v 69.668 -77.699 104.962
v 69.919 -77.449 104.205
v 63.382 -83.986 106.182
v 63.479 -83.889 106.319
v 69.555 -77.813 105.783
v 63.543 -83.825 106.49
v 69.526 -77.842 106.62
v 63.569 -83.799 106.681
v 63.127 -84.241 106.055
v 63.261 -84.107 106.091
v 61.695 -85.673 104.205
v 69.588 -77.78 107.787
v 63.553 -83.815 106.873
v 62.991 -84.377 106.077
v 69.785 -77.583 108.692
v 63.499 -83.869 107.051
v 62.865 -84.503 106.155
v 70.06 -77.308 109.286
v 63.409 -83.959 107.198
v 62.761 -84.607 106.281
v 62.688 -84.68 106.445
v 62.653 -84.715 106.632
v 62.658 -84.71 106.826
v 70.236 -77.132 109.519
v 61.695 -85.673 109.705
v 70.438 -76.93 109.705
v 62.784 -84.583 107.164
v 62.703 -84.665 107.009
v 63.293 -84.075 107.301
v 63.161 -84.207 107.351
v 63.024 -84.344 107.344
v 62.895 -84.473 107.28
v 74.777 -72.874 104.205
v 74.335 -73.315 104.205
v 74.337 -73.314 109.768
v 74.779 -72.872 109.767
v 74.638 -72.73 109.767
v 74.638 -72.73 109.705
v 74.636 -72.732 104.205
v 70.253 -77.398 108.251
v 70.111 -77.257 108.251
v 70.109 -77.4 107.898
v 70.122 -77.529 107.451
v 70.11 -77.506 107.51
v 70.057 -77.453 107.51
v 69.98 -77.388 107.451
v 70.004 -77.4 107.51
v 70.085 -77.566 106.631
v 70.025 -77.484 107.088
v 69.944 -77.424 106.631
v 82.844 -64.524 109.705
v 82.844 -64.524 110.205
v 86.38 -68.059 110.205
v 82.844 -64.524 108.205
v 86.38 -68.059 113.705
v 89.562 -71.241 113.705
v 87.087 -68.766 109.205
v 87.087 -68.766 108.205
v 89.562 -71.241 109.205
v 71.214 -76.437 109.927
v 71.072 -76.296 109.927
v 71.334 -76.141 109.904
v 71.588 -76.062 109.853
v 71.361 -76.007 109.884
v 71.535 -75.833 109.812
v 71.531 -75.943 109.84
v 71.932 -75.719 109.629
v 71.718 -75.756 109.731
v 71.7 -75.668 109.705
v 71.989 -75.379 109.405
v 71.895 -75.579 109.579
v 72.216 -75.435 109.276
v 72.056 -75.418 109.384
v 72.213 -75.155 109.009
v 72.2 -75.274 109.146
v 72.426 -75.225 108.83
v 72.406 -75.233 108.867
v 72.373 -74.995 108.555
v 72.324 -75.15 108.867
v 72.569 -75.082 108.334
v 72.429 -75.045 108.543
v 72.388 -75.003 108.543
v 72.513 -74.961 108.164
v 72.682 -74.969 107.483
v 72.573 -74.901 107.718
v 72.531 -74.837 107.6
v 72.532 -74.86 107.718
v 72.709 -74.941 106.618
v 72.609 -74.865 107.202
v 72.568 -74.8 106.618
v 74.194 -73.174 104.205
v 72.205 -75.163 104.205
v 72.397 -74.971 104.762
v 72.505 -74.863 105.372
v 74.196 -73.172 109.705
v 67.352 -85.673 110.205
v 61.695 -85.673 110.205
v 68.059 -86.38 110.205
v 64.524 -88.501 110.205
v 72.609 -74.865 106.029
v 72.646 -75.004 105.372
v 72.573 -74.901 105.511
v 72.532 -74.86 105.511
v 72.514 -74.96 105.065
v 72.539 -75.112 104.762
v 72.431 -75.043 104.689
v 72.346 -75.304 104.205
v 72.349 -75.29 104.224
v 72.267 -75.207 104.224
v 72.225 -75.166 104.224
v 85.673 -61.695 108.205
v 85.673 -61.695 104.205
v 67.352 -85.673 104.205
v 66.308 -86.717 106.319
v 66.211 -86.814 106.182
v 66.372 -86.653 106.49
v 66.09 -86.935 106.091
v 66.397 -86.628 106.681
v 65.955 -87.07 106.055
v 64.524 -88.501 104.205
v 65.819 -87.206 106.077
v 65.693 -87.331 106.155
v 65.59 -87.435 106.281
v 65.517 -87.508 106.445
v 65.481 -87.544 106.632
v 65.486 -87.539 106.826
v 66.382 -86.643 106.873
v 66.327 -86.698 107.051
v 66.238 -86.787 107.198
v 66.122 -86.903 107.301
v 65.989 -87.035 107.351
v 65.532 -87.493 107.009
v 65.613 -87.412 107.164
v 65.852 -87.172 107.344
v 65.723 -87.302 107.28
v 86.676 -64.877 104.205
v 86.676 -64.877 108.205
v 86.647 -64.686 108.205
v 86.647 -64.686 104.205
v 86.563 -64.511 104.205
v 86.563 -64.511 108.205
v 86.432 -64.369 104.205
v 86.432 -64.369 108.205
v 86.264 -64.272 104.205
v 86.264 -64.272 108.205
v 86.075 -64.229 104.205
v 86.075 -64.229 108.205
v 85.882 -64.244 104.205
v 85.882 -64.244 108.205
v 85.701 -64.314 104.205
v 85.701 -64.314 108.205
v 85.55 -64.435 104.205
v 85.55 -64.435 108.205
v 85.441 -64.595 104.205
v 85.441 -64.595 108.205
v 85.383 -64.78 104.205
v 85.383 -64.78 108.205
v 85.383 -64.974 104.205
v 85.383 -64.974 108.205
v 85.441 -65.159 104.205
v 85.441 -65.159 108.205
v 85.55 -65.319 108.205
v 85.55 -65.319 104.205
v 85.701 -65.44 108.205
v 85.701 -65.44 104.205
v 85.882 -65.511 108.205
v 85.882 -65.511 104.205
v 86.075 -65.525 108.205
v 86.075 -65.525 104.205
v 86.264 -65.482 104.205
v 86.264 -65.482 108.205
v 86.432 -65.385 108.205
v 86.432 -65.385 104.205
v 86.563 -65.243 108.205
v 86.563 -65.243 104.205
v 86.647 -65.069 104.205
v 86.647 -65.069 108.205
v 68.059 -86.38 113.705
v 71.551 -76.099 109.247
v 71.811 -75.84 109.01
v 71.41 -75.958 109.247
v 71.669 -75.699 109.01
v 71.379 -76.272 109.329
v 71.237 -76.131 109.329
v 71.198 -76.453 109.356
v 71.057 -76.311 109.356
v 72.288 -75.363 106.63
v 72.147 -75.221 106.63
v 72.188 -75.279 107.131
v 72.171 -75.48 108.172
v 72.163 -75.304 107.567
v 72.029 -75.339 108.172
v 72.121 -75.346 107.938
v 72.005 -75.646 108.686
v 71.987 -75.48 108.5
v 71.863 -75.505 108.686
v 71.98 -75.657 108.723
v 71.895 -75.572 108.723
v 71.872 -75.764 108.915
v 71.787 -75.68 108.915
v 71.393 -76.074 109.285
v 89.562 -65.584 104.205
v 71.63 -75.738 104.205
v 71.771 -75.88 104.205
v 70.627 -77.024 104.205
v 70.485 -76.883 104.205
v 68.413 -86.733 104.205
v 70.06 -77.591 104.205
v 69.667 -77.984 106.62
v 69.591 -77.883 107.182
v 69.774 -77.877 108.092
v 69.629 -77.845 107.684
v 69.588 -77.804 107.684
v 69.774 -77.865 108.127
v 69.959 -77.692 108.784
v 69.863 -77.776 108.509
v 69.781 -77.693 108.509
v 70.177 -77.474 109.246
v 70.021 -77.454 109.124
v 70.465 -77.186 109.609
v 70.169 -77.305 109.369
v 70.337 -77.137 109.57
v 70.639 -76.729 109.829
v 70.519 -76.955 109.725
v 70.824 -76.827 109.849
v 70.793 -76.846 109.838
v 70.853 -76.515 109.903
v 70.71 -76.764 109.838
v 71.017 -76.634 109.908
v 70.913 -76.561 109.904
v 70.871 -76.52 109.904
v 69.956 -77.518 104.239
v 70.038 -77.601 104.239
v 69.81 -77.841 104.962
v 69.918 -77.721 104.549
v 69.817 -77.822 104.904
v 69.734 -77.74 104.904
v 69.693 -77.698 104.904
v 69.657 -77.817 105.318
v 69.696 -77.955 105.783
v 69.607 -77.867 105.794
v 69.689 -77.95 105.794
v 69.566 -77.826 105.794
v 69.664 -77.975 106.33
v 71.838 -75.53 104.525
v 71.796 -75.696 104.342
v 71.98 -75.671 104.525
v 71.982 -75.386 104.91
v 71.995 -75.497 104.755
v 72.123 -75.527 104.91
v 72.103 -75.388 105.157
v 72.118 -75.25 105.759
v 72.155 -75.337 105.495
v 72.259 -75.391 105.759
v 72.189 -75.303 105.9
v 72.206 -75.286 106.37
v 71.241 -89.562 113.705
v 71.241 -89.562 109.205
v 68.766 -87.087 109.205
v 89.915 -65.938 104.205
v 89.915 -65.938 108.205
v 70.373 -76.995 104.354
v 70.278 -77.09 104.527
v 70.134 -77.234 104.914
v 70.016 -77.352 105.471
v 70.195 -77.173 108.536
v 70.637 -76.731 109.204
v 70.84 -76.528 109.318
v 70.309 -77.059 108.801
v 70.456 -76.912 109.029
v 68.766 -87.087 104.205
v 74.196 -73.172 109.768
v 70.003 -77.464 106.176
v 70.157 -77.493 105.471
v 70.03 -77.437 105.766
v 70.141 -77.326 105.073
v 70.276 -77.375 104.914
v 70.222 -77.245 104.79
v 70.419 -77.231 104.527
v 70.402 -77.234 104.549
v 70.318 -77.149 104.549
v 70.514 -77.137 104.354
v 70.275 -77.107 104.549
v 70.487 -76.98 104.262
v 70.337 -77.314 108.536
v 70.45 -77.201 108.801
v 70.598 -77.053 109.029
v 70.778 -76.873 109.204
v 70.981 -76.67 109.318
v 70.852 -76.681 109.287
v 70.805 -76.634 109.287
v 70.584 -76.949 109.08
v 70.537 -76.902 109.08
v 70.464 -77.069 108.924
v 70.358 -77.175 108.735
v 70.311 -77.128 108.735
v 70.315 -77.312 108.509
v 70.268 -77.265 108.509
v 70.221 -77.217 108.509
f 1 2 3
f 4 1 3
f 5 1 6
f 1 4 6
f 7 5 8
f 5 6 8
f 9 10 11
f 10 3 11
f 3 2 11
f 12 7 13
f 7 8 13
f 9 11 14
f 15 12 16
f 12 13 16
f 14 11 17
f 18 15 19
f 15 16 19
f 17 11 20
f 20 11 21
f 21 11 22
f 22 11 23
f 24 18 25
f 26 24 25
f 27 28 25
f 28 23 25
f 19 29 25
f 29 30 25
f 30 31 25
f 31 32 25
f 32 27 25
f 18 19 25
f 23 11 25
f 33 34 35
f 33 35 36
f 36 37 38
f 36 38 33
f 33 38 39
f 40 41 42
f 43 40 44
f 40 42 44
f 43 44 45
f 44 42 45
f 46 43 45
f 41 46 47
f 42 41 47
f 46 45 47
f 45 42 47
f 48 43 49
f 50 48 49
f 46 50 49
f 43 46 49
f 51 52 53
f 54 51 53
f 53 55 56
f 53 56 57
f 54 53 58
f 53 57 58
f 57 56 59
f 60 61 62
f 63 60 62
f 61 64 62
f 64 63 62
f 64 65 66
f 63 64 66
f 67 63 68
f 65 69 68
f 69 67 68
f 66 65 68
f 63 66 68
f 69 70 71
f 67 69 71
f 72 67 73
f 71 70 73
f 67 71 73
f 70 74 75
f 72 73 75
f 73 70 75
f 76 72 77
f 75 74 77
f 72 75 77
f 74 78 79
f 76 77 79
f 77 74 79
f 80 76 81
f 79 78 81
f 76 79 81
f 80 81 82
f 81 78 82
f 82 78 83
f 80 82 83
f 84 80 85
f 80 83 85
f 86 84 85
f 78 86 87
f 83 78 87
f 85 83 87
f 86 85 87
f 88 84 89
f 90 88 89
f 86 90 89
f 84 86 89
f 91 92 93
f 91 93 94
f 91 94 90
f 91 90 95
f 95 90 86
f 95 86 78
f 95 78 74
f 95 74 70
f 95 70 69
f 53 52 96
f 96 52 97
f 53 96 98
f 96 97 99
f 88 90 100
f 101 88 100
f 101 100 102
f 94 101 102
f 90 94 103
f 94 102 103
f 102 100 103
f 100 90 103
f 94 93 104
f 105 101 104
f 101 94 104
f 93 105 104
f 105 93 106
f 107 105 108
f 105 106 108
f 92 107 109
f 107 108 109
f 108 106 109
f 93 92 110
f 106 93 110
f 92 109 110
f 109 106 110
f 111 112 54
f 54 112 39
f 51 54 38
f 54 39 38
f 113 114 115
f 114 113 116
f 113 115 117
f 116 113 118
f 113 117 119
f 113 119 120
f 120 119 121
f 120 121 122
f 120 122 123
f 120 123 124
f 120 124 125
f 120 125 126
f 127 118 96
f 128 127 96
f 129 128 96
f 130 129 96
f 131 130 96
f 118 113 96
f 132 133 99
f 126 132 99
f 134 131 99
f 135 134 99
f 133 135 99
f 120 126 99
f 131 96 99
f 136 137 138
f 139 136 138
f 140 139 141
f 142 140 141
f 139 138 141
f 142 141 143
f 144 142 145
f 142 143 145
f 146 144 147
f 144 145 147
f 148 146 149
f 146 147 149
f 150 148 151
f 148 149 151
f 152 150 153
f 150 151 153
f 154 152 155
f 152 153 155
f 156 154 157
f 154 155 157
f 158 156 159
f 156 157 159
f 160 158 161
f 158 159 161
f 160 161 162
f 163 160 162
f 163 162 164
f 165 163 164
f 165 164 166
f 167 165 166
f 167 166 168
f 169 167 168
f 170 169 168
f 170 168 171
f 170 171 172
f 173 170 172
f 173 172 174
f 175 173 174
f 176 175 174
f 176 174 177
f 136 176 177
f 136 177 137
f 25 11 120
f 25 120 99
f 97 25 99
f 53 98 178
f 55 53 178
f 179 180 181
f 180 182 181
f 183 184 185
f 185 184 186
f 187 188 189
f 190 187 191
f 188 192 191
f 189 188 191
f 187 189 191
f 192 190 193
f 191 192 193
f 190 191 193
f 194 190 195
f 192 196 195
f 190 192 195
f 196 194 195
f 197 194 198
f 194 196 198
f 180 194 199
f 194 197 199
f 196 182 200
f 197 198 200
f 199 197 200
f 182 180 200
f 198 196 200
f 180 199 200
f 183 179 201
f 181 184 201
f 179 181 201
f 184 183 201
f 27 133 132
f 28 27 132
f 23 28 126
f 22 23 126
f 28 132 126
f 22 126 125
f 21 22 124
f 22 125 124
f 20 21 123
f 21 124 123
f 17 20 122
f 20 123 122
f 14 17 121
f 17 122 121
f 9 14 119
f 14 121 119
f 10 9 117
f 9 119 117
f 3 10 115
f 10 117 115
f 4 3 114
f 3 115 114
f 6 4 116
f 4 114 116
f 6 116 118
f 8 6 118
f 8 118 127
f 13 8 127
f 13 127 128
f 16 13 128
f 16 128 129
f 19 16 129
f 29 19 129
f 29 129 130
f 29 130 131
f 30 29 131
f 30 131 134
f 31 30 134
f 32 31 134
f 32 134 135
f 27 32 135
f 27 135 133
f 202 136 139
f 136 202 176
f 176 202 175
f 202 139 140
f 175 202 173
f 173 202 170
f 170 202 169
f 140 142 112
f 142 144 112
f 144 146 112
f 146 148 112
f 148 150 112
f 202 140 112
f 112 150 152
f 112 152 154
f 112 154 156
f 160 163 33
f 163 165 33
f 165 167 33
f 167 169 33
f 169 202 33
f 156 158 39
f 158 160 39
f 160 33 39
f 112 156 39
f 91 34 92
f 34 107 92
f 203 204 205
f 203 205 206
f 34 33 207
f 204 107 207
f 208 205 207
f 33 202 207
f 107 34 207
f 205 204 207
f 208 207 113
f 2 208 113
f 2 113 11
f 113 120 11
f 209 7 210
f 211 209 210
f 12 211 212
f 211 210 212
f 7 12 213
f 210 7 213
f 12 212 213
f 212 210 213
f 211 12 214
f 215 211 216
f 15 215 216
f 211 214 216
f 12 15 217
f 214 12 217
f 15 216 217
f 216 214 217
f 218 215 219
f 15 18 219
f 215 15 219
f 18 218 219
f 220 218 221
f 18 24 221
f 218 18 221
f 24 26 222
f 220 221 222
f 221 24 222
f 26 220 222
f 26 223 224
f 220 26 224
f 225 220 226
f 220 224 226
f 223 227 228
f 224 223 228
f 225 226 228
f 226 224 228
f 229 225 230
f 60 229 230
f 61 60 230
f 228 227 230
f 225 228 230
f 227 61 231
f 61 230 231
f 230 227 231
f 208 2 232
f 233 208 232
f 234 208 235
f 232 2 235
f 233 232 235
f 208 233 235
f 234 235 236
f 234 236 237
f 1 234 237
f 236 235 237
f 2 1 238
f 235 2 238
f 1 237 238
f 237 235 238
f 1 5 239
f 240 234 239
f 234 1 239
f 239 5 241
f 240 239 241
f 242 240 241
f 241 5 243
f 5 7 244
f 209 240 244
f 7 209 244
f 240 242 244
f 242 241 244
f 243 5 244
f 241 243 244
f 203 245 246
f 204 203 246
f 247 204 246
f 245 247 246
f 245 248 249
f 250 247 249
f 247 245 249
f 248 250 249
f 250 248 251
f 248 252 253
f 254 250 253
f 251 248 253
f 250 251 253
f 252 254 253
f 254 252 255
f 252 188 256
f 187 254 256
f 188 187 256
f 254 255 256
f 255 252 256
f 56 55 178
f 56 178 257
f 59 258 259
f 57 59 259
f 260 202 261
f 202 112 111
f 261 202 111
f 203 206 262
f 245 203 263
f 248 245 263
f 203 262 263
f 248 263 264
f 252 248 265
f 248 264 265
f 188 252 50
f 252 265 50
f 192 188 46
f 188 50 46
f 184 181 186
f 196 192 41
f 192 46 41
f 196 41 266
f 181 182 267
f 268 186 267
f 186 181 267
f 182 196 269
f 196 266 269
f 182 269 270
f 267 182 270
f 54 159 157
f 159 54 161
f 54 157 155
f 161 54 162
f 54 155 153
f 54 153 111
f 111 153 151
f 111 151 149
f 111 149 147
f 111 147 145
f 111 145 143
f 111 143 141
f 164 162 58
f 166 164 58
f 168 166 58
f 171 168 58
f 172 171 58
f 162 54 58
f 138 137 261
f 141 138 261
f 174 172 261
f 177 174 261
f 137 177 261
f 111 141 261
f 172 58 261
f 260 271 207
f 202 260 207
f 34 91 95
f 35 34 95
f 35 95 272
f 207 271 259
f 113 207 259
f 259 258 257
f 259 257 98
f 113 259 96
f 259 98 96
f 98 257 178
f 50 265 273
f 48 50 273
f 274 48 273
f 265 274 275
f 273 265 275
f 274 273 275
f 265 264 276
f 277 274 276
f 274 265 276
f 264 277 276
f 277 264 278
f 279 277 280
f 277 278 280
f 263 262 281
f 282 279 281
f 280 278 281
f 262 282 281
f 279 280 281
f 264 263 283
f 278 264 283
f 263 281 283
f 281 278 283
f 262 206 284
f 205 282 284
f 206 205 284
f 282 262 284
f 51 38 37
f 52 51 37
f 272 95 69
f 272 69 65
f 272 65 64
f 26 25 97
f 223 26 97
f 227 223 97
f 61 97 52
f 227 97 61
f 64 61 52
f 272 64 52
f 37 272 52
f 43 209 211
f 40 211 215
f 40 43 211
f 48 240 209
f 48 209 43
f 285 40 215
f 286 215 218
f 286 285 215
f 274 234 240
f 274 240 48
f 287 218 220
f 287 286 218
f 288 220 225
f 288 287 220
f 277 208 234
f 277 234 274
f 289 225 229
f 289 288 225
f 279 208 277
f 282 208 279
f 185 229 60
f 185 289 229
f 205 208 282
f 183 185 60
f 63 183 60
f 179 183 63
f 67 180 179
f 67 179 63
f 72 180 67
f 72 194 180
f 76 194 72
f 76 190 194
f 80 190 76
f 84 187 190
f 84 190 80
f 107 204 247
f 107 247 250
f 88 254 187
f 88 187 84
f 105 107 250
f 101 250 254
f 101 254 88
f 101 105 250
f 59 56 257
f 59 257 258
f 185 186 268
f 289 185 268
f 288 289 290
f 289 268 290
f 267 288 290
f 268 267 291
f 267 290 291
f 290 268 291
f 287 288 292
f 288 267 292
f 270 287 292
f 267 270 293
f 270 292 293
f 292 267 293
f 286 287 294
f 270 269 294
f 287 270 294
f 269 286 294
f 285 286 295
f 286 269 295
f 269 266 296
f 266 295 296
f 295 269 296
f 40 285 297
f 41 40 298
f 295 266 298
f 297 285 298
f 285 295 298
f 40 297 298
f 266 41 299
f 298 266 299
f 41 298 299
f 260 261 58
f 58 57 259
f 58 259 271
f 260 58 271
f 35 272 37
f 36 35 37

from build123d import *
from build123d.topology import SkipClean

# Parameters (mm, degrees)
STOCK_GOUX_START         = -16.954591703
STOCK_GOUX_LIKED_1_DEPTH = 33.909183406
SKETCH1_W                = 5.499999668
SKETCH1_H                = 5.499999668
BOSS_EXTRUDE1_DEPTH      = 33.909183
CUT_EXTRUDE1_DEPTH       = 0.2
SKETCH5_W                = 5.500000112
SKETCH5_H                = 4
CUT_EXTRUDE2_DEPTH       = 116.998760999
CUT_EXTRUDE3_REACH       = 131.039
SKETCH6_R                = 0.64999997
CIRPATTERN1_COUNT        = 2


# Read off the part's stored shape, not the designer's step: Stock-Goux Liked-1
with BuildPart() as part:
    # Stock-Goux Liked-1 outline → Stock-Goux Liked-1 (new body)
    with BuildSketch(Plane(origin=(0, 0, 0), x_dir=(0.7071067811865471, -0.707106781186548, -1.0381022375924514e-12), z_dir=(0.707106781186548, 0.707106781186547, 1.03810223759245e-12)).offset(STOCK_GOUX_START)):
        Polygon((113.704878, -109.20487811), (110.204877888, -109.20487811), (110.204877888, -104.204878204), (109.704877872, -104.204878204), (109.704877872, -109.704877872), (104.204878204, -109.704877872), (104.204878204, -110.204877888), (109.20487811, -110.204877888), (109.20487811, -113.704878), (113.704878, -113.704878), align=None)
    extrude(amount=STOCK_GOUX_LIKED_1_DEPTH)

    # Sketch1 → Boss-Extrude1 (add)
    with SkipClean():  # the faces are left unmerged after this step: merging them gives an invalid solid
        with BuildSketch(Plane(origin=(-11.988706765, -11.988706765, 0), x_dir=(0, 0, 1), z_dir=(-0.7071067811865476, -0.7071067811865476, -1.0381022375924498e-12))):
            with Locations((106.954878038, -106.954878038)):
                Rectangle(SKETCH1_W, SKETCH1_H)
        extrude(amount=-BOSS_EXTRUDE1_DEPTH)

    # Sketch4 → Cut-Extrude1 (cut)
    # profile 1 of 2: a face of its own
    with SkipClean():  # the faces are left unmerged after this step: merging them gives an invalid solid
        with BuildSketch(Plane(origin=(73.683976011, -73.683976011, 109.3690912), x_dir=(-0.577350269189024, -0.5773502691890293, -0.5773502691908239), z_dir=(0.7071067811865546, -0.7071067811865406, -7.406550393246722e-15))):
            Polygon((1.809420407, 5.9526292), (2.820688436, 5.237745386), (-0.821148503, 0.092362774), (-1.331234641, 0.453620787), (1.954432426, 5.095277437), (1.145418003, 5.667693303), align=None)
        # profile 2 of 2: a face of its own
        with BuildSketch(Plane(origin=(73.683976011, -73.683976011, 109.3690912), x_dir=(-0.577350269189024, -0.5773502691890293, -0.5773502691908239), z_dir=(0.7071067811865546, -0.7071067811865406, -7.406550393246722e-15))):
            with BuildLine():
                add(Edge.make_bspline(
                    [(2.877099219, 1.335109376), (2.935838558, 1.417405427), (3.049870438, 1.577168434), (3.226094966, 1.802117563), (3.397935378, 2.009052811), (3.565846799, 2.196717165), (3.731042214, 2.364759935), (3.892218805, 2.513489688), (4.049493585, 2.6446306), (4.206341025, 2.754179531), (4.360025947, 2.849477701), (4.513266986, 2.930884131), (4.665815664, 3.001483938), (4.818515166, 3.0586782), (4.970617605, 3.103726049), (5.122467787, 3.135794894), (5.273974853, 3.1545795), (5.424485375, 3.162398332), (5.57291168, 3.158649601), (5.71885612, 3.143489484), (5.861127958, 3.116280577), (6.000815508, 3.080299839), (6.135189962, 3.029311133), (6.267827501, 2.971265194), (6.395960204, 2.899842577), (6.477761121, 2.844757759), (6.518936158, 2.817030449)],
                    knots=[0, 0, 0, 0, 1.645926604, 3.195270974, 4.650990582, 6.024584171, 7.293755489, 8.485788563, 9.594173223, 10.624575106, 11.597800751, 12.536632912, 13.44787851, 14.332590146, 15.188862484, 16.028272991, 16.856251527, 17.671878837, 18.479816086, 19.271126229, 20.057755364, 20.836377498, 21.616069947, 22.394783881, 23.192003771, 24, 24, 24, 24], degree=3))
                add(Edge.make_bspline(
                    [(6.518936158, 2.817030449), (6.55976619, 2.787194518), (6.640619439, 2.728112222), (6.751575276, 2.627837993), (6.852736041, 2.520826461), (6.947411421, 2.408793466), (7.028861928, 2.287452494), (7.103669209, 2.160876743), (7.168780117, 2.027049302), (7.222899915, 1.885998413), (7.267901579, 1.739512987), (7.300866367, 1.587191132), (7.322801886, 1.429869211), (7.330695863, 1.26694766), (7.330109349, 1.099094482), (7.315823786, 0.925626884), (7.288049754, 0.747536935), (7.251766786, 0.563275675), (7.200579852, 0.372683439), (7.132420302, 0.175939832), (7.049730345, -0.028750132), (6.948143476, -0.239331033), (6.832538734, -0.457983193), (6.701011573, -0.684022575), (6.552211688, -0.916111082), (6.444401149, -1.071082575), (6.389188562, -1.150447515)],
                    knots=[0, 0, 0, 0, 0.816802234, 1.617464211, 2.412328798, 3.195799554, 3.984556322, 4.770779044, 5.57064894, 6.386329449, 7.210029482, 8.044686804, 8.902317584, 9.773878156, 10.678405193, 11.613358687, 12.583410326, 13.589949519, 14.647090142, 15.769568218, 16.952951381, 18.212671993, 19.546052618, 20.949315433, 22.437664922, 24, 24, 24, 24], degree=3))
                add(Edge.make_bspline(
                    [(6.389188562, -1.150447515), (6.332868819, -1.228410619), (6.222953274, -1.380566091), (6.053980888, -1.59680156), (5.886092947, -1.795129872), (5.720527442, -1.977104519), (5.555468389, -2.14060009), (5.392619894, -2.288332456), (5.229879441, -2.416533943), (5.06880285, -2.528231787), (4.908319086, -2.62376275), (4.750132346, -2.708320198), (4.591787049, -2.778366159), (4.43448342, -2.83591584), (4.277857668, -2.882112619), (4.121447774, -2.915750879), (3.965574172, -2.934147856), (3.811266823, -2.942458126), (3.659376547, -2.93720443), (3.510689745, -2.920194702), (3.36547389, -2.894056504), (3.223504099, -2.855347129), (3.084985381, -2.806224594), (2.95051219, -2.744153097), (2.819392507, -2.672081016), (2.735930058, -2.616047292), (2.693926142, -2.587847355)],
                    knots=[0, 0, 0, 0, 1.555964073, 3.036672929, 4.438544486, 5.759244319, 7.015609763, 8.196038705, 9.314565292, 10.364961386, 11.364978532, 12.334676732, 13.26524597, 14.163730662, 15.042916469, 15.905349198, 16.748578791, 17.579666054, 18.403330588, 19.204079274, 19.99928434, 20.788072044, 21.582240779, 22.374243664, 23.181810095, 24, 24, 24, 24], degree=3))
                add(Edge.make_bspline(
                    [(2.693926142, -2.587847355), (2.653972599, -2.558392707), (2.574601729, -2.49987872), (2.465975341, -2.401634599), (2.365605333, -2.297566017), (2.2736202, -2.1872728), (2.192619489, -2.068887343), (2.120885752, -1.944019679), (2.056991419, -1.813489721), (2.003797834, -1.675531189), (1.960019447, -1.532477258), (1.930351112, -1.383658885), (1.908865252, -1.230366615), (1.902666695, -1.072067221), (1.904295565, -0.908849471), (1.920445231, -0.741043703), (1.947114369, -0.568163649), (1.985744352, -0.389662384), (2.037667139, -0.203869884), (2.109148043, -0.010956547), (2.193927603, 0.192170439), (2.298441048, 0.403140358), (2.41709386, 0.624619201), (2.556318665, 0.8530354), (2.707928908, 1.093119466), (2.819610096, 1.252873979), (2.877099219, 1.335109376)],
                    knots=[0, 0, 0, 0, 0.808779551, 1.606704505, 2.384003051, 3.164613963, 3.944979997, 4.719198901, 5.510630197, 6.311633127, 7.127324821, 7.946144414, 8.782972344, 9.648016313, 10.525999108, 11.442197657, 12.393424347, 13.376370558, 14.417965243, 15.535316785, 16.727980085, 18.004753573, 19.371800586, 20.822810559, 22.364506719, 24, 24, 24, 24], degree=3))
            make_face()
            with BuildLine():
                add(Edge.make_bspline(
                    [(3.35665651, 0.981483574), (3.306978299, 0.911008481), (3.210677048, 0.774392459), (3.078907805, 0.570533382), (2.960189865, 0.377340166), (2.855654482, 0.194154463), (2.764740054, 0.020871626), (2.688020563, -0.142683987), (2.626604617, -0.296952862), (2.578871536, -0.44232507), (2.542700408, -0.580836662), (2.517352523, -0.715193163), (2.500264654, -0.845562566), (2.494109389, -0.973145552), (2.496347211, -1.096867933), (2.508033102, -1.217594791), (2.527765974, -1.33483755), (2.568655303, -1.483337821), (2.636042316, -1.657054286), (2.74538605, -1.843427475), (2.878111587, -2.00703341), (2.986845425, -2.092357104), (3.041191767, -2.135002804)],
                    knots=[0, 0, 0, 0, 1.477317626, 2.863781319, 4.158438436, 5.362400069, 6.477048567, 7.510710121, 8.456474969, 9.320360837, 10.130971237, 10.907558897, 11.661836949, 12.382033042, 13.094195176, 13.780270445, 14.458724783, 15.128447747, 16.416912985, 17.638070278, 18.819482119, 20, 20, 20, 20], degree=3))
                add(Edge.make_bspline(
                    [(3.041191767, -2.135002804), (3.099800739, -2.17244124), (3.216225144, -2.246811213), (3.413201595, -2.319023125), (3.622686973, -2.359717176), (3.805834636, -2.366647976), (3.95654946, -2.355929609), (4.071529863, -2.334291982), (4.187465506, -2.305679231), (4.303749507, -2.265403285), (4.421139745, -2.216249685), (4.537600801, -2.154256666), (4.65562294, -2.084375634), (4.732050575, -2.03119598), (4.771159716, -2.003983172)],
                    knots=[0, 0, 0, 0, 1.344638482, 2.671071166, 4.036222541, 5.467361339, 6.209241076, 6.960484297, 7.73186595, 8.521933696, 9.343145882, 10.195949186, 11.076840779, 12, 12, 12, 12], degree=3))
                add(Edge.make_bspline(
                    [(4.771159716, -2.003983172), (4.82003051, -1.9686221), (4.919374766, -1.896740325), (5.060918815, -1.774154816), (5.203980243, -1.643204395), (5.346378414, -1.50118221), (5.486261966, -1.346204267), (5.625768107, -1.181134288), (5.765465845, -1.005346674), (5.854185711, -0.881592057), (5.899454988, -0.818446313)],
                    knots=[0, 0, 0, 0, 0.88015219, 1.789168058, 2.730971114, 3.71133991, 4.723490847, 5.777526881, 6.865983973, 8, 8, 8, 8], degree=3))
                add(Edge.make_bspline(
                    [(5.899454988, -0.818446313), (5.943440103, -0.754631373), (6.029543374, -0.629710132), (6.150227485, -0.443464789), (6.259152206, -0.262044693), (6.355718777, -0.085418135), (6.441234167, 0.086343364), (6.515300272, 0.253071347), (6.577842064, 0.414764781), (6.629318725, 0.571342113), (6.668108931, 0.723318751), (6.699830384, 0.869038513), (6.718294541, 1.009907895), (6.729255617, 1.144940449), (6.729305449, 1.27510735), (6.719388817, 1.399803316), (6.699117623, 1.519074129), (6.658532604, 1.667727811), (6.589724745, 1.839773408), (6.485308774, 2.027436778), (6.35071278, 2.187039301), (6.243987251, 2.272131395), (6.190751062, 2.314576523)],
                    knots=[0, 0, 0, 0, 1.329008706, 2.601607309, 3.804917726, 4.956779838, 6.052592714, 7.094265147, 8.08401922, 9.024445114, 9.918561811, 10.772732897, 11.579936426, 12.352846219, 13.094480438, 13.809401199, 14.495531423, 15.16575916, 16.448433362, 17.663221731, 18.834382256, 20, 20, 20, 20], degree=3))
                add(Edge.make_bspline(
                    [(6.190751062, 2.314576523), (6.132614295, 2.352127809), (6.016155599, 2.427349979), (5.81770787, 2.498184297), (5.606353968, 2.539715843), (5.382213361, 2.546580658), (5.149380752, 2.518724602), (4.913135228, 2.450090337), (4.677174981, 2.338776518), (4.482367978, 2.216674302), (4.323401293, 2.097053878), (4.19971893, 1.986444491), (4.06914087, 1.861579711), (3.934519899, 1.718976231), (3.796468021, 1.558053158), (3.652668391, 1.381505856), (3.505185008, 1.187646731), (3.407224802, 1.051674271), (3.35665651, 0.981483574)],
                    knots=[0, 0, 0, 0, 0.946200866, 1.895415318, 2.86683806, 3.890638819, 4.95642944, 6.069637659, 7.24797886, 8.522380418, 9.215378954, 9.973389102, 10.795730965, 11.692243744, 12.6608267, 13.702269491, 14.813882584, 16, 16, 16, 16], degree=3))
            make_face(mode=Mode.SUBTRACT)
        extrude(amount=CUT_EXTRUDE1_DEPTH, mode=Mode.SUBTRACT)

    # Sketch5 → Cut-Extrude2 (cut, symmetric)
    with BuildSketch(Plane(origin=(77.926616474, -77.926616474, 0), x_dir=(0, 0, -1), z_dir=(0.7071067811865549, -0.7071067811865401, -7.502698527565898e-15))):
        with Locations((-110.954877944, 14.954591703)):
            Rectangle(SKETCH5_W, SKETCH5_H)
    cut_extrude2 = extrude(amount=CUT_EXTRUDE2_DEPTH, both=True, mode=Mode.SUBTRACT)

    # Sketch6 → Cut-Extrude3 (cut, up to next)
    with BuildSketch(Plane.XY.offset(108.204877888), mode=Mode.PRIVATE) as cut_extrude3_sk1:
        with Locations((86.026236134, -64.877249727)):
            Circle(SKETCH6_R)
    cut_extrude3_tool1 = extrude(cut_extrude3_sk1.sketch, amount=-CUT_EXTRUDE3_REACH, mode=Mode.PRIVATE) & part.part
    cut_extrude3 = cut_extrude3_tool1.solids().sort_by_distance((86.026236, -64.87725, 108.204878))[0]
    add(cut_extrude3, mode=Mode.SUBTRACT)

    # CirPattern1: Cut-Extrude2, Cut-Extrude3 ×2 about axis
    cirpattern1_axis = Axis((0, 0, 0), (0.49999999999973677, -0.5000000000002639, 0.7071067811865471))
    add([cut_extrude2.rotate(cirpattern1_axis, i * 360 / CIRPATTERN1_COUNT) for i in range(1, CIRPATTERN1_COUNT)], mode=Mode.SUBTRACT)
    add([cut_extrude3.rotate(cirpattern1_axis, i * 360 / CIRPATTERN1_COUNT) for i in range(1, CIRPATTERN1_COUNT)], mode=Mode.SUBTRACT)


solid = part.part
